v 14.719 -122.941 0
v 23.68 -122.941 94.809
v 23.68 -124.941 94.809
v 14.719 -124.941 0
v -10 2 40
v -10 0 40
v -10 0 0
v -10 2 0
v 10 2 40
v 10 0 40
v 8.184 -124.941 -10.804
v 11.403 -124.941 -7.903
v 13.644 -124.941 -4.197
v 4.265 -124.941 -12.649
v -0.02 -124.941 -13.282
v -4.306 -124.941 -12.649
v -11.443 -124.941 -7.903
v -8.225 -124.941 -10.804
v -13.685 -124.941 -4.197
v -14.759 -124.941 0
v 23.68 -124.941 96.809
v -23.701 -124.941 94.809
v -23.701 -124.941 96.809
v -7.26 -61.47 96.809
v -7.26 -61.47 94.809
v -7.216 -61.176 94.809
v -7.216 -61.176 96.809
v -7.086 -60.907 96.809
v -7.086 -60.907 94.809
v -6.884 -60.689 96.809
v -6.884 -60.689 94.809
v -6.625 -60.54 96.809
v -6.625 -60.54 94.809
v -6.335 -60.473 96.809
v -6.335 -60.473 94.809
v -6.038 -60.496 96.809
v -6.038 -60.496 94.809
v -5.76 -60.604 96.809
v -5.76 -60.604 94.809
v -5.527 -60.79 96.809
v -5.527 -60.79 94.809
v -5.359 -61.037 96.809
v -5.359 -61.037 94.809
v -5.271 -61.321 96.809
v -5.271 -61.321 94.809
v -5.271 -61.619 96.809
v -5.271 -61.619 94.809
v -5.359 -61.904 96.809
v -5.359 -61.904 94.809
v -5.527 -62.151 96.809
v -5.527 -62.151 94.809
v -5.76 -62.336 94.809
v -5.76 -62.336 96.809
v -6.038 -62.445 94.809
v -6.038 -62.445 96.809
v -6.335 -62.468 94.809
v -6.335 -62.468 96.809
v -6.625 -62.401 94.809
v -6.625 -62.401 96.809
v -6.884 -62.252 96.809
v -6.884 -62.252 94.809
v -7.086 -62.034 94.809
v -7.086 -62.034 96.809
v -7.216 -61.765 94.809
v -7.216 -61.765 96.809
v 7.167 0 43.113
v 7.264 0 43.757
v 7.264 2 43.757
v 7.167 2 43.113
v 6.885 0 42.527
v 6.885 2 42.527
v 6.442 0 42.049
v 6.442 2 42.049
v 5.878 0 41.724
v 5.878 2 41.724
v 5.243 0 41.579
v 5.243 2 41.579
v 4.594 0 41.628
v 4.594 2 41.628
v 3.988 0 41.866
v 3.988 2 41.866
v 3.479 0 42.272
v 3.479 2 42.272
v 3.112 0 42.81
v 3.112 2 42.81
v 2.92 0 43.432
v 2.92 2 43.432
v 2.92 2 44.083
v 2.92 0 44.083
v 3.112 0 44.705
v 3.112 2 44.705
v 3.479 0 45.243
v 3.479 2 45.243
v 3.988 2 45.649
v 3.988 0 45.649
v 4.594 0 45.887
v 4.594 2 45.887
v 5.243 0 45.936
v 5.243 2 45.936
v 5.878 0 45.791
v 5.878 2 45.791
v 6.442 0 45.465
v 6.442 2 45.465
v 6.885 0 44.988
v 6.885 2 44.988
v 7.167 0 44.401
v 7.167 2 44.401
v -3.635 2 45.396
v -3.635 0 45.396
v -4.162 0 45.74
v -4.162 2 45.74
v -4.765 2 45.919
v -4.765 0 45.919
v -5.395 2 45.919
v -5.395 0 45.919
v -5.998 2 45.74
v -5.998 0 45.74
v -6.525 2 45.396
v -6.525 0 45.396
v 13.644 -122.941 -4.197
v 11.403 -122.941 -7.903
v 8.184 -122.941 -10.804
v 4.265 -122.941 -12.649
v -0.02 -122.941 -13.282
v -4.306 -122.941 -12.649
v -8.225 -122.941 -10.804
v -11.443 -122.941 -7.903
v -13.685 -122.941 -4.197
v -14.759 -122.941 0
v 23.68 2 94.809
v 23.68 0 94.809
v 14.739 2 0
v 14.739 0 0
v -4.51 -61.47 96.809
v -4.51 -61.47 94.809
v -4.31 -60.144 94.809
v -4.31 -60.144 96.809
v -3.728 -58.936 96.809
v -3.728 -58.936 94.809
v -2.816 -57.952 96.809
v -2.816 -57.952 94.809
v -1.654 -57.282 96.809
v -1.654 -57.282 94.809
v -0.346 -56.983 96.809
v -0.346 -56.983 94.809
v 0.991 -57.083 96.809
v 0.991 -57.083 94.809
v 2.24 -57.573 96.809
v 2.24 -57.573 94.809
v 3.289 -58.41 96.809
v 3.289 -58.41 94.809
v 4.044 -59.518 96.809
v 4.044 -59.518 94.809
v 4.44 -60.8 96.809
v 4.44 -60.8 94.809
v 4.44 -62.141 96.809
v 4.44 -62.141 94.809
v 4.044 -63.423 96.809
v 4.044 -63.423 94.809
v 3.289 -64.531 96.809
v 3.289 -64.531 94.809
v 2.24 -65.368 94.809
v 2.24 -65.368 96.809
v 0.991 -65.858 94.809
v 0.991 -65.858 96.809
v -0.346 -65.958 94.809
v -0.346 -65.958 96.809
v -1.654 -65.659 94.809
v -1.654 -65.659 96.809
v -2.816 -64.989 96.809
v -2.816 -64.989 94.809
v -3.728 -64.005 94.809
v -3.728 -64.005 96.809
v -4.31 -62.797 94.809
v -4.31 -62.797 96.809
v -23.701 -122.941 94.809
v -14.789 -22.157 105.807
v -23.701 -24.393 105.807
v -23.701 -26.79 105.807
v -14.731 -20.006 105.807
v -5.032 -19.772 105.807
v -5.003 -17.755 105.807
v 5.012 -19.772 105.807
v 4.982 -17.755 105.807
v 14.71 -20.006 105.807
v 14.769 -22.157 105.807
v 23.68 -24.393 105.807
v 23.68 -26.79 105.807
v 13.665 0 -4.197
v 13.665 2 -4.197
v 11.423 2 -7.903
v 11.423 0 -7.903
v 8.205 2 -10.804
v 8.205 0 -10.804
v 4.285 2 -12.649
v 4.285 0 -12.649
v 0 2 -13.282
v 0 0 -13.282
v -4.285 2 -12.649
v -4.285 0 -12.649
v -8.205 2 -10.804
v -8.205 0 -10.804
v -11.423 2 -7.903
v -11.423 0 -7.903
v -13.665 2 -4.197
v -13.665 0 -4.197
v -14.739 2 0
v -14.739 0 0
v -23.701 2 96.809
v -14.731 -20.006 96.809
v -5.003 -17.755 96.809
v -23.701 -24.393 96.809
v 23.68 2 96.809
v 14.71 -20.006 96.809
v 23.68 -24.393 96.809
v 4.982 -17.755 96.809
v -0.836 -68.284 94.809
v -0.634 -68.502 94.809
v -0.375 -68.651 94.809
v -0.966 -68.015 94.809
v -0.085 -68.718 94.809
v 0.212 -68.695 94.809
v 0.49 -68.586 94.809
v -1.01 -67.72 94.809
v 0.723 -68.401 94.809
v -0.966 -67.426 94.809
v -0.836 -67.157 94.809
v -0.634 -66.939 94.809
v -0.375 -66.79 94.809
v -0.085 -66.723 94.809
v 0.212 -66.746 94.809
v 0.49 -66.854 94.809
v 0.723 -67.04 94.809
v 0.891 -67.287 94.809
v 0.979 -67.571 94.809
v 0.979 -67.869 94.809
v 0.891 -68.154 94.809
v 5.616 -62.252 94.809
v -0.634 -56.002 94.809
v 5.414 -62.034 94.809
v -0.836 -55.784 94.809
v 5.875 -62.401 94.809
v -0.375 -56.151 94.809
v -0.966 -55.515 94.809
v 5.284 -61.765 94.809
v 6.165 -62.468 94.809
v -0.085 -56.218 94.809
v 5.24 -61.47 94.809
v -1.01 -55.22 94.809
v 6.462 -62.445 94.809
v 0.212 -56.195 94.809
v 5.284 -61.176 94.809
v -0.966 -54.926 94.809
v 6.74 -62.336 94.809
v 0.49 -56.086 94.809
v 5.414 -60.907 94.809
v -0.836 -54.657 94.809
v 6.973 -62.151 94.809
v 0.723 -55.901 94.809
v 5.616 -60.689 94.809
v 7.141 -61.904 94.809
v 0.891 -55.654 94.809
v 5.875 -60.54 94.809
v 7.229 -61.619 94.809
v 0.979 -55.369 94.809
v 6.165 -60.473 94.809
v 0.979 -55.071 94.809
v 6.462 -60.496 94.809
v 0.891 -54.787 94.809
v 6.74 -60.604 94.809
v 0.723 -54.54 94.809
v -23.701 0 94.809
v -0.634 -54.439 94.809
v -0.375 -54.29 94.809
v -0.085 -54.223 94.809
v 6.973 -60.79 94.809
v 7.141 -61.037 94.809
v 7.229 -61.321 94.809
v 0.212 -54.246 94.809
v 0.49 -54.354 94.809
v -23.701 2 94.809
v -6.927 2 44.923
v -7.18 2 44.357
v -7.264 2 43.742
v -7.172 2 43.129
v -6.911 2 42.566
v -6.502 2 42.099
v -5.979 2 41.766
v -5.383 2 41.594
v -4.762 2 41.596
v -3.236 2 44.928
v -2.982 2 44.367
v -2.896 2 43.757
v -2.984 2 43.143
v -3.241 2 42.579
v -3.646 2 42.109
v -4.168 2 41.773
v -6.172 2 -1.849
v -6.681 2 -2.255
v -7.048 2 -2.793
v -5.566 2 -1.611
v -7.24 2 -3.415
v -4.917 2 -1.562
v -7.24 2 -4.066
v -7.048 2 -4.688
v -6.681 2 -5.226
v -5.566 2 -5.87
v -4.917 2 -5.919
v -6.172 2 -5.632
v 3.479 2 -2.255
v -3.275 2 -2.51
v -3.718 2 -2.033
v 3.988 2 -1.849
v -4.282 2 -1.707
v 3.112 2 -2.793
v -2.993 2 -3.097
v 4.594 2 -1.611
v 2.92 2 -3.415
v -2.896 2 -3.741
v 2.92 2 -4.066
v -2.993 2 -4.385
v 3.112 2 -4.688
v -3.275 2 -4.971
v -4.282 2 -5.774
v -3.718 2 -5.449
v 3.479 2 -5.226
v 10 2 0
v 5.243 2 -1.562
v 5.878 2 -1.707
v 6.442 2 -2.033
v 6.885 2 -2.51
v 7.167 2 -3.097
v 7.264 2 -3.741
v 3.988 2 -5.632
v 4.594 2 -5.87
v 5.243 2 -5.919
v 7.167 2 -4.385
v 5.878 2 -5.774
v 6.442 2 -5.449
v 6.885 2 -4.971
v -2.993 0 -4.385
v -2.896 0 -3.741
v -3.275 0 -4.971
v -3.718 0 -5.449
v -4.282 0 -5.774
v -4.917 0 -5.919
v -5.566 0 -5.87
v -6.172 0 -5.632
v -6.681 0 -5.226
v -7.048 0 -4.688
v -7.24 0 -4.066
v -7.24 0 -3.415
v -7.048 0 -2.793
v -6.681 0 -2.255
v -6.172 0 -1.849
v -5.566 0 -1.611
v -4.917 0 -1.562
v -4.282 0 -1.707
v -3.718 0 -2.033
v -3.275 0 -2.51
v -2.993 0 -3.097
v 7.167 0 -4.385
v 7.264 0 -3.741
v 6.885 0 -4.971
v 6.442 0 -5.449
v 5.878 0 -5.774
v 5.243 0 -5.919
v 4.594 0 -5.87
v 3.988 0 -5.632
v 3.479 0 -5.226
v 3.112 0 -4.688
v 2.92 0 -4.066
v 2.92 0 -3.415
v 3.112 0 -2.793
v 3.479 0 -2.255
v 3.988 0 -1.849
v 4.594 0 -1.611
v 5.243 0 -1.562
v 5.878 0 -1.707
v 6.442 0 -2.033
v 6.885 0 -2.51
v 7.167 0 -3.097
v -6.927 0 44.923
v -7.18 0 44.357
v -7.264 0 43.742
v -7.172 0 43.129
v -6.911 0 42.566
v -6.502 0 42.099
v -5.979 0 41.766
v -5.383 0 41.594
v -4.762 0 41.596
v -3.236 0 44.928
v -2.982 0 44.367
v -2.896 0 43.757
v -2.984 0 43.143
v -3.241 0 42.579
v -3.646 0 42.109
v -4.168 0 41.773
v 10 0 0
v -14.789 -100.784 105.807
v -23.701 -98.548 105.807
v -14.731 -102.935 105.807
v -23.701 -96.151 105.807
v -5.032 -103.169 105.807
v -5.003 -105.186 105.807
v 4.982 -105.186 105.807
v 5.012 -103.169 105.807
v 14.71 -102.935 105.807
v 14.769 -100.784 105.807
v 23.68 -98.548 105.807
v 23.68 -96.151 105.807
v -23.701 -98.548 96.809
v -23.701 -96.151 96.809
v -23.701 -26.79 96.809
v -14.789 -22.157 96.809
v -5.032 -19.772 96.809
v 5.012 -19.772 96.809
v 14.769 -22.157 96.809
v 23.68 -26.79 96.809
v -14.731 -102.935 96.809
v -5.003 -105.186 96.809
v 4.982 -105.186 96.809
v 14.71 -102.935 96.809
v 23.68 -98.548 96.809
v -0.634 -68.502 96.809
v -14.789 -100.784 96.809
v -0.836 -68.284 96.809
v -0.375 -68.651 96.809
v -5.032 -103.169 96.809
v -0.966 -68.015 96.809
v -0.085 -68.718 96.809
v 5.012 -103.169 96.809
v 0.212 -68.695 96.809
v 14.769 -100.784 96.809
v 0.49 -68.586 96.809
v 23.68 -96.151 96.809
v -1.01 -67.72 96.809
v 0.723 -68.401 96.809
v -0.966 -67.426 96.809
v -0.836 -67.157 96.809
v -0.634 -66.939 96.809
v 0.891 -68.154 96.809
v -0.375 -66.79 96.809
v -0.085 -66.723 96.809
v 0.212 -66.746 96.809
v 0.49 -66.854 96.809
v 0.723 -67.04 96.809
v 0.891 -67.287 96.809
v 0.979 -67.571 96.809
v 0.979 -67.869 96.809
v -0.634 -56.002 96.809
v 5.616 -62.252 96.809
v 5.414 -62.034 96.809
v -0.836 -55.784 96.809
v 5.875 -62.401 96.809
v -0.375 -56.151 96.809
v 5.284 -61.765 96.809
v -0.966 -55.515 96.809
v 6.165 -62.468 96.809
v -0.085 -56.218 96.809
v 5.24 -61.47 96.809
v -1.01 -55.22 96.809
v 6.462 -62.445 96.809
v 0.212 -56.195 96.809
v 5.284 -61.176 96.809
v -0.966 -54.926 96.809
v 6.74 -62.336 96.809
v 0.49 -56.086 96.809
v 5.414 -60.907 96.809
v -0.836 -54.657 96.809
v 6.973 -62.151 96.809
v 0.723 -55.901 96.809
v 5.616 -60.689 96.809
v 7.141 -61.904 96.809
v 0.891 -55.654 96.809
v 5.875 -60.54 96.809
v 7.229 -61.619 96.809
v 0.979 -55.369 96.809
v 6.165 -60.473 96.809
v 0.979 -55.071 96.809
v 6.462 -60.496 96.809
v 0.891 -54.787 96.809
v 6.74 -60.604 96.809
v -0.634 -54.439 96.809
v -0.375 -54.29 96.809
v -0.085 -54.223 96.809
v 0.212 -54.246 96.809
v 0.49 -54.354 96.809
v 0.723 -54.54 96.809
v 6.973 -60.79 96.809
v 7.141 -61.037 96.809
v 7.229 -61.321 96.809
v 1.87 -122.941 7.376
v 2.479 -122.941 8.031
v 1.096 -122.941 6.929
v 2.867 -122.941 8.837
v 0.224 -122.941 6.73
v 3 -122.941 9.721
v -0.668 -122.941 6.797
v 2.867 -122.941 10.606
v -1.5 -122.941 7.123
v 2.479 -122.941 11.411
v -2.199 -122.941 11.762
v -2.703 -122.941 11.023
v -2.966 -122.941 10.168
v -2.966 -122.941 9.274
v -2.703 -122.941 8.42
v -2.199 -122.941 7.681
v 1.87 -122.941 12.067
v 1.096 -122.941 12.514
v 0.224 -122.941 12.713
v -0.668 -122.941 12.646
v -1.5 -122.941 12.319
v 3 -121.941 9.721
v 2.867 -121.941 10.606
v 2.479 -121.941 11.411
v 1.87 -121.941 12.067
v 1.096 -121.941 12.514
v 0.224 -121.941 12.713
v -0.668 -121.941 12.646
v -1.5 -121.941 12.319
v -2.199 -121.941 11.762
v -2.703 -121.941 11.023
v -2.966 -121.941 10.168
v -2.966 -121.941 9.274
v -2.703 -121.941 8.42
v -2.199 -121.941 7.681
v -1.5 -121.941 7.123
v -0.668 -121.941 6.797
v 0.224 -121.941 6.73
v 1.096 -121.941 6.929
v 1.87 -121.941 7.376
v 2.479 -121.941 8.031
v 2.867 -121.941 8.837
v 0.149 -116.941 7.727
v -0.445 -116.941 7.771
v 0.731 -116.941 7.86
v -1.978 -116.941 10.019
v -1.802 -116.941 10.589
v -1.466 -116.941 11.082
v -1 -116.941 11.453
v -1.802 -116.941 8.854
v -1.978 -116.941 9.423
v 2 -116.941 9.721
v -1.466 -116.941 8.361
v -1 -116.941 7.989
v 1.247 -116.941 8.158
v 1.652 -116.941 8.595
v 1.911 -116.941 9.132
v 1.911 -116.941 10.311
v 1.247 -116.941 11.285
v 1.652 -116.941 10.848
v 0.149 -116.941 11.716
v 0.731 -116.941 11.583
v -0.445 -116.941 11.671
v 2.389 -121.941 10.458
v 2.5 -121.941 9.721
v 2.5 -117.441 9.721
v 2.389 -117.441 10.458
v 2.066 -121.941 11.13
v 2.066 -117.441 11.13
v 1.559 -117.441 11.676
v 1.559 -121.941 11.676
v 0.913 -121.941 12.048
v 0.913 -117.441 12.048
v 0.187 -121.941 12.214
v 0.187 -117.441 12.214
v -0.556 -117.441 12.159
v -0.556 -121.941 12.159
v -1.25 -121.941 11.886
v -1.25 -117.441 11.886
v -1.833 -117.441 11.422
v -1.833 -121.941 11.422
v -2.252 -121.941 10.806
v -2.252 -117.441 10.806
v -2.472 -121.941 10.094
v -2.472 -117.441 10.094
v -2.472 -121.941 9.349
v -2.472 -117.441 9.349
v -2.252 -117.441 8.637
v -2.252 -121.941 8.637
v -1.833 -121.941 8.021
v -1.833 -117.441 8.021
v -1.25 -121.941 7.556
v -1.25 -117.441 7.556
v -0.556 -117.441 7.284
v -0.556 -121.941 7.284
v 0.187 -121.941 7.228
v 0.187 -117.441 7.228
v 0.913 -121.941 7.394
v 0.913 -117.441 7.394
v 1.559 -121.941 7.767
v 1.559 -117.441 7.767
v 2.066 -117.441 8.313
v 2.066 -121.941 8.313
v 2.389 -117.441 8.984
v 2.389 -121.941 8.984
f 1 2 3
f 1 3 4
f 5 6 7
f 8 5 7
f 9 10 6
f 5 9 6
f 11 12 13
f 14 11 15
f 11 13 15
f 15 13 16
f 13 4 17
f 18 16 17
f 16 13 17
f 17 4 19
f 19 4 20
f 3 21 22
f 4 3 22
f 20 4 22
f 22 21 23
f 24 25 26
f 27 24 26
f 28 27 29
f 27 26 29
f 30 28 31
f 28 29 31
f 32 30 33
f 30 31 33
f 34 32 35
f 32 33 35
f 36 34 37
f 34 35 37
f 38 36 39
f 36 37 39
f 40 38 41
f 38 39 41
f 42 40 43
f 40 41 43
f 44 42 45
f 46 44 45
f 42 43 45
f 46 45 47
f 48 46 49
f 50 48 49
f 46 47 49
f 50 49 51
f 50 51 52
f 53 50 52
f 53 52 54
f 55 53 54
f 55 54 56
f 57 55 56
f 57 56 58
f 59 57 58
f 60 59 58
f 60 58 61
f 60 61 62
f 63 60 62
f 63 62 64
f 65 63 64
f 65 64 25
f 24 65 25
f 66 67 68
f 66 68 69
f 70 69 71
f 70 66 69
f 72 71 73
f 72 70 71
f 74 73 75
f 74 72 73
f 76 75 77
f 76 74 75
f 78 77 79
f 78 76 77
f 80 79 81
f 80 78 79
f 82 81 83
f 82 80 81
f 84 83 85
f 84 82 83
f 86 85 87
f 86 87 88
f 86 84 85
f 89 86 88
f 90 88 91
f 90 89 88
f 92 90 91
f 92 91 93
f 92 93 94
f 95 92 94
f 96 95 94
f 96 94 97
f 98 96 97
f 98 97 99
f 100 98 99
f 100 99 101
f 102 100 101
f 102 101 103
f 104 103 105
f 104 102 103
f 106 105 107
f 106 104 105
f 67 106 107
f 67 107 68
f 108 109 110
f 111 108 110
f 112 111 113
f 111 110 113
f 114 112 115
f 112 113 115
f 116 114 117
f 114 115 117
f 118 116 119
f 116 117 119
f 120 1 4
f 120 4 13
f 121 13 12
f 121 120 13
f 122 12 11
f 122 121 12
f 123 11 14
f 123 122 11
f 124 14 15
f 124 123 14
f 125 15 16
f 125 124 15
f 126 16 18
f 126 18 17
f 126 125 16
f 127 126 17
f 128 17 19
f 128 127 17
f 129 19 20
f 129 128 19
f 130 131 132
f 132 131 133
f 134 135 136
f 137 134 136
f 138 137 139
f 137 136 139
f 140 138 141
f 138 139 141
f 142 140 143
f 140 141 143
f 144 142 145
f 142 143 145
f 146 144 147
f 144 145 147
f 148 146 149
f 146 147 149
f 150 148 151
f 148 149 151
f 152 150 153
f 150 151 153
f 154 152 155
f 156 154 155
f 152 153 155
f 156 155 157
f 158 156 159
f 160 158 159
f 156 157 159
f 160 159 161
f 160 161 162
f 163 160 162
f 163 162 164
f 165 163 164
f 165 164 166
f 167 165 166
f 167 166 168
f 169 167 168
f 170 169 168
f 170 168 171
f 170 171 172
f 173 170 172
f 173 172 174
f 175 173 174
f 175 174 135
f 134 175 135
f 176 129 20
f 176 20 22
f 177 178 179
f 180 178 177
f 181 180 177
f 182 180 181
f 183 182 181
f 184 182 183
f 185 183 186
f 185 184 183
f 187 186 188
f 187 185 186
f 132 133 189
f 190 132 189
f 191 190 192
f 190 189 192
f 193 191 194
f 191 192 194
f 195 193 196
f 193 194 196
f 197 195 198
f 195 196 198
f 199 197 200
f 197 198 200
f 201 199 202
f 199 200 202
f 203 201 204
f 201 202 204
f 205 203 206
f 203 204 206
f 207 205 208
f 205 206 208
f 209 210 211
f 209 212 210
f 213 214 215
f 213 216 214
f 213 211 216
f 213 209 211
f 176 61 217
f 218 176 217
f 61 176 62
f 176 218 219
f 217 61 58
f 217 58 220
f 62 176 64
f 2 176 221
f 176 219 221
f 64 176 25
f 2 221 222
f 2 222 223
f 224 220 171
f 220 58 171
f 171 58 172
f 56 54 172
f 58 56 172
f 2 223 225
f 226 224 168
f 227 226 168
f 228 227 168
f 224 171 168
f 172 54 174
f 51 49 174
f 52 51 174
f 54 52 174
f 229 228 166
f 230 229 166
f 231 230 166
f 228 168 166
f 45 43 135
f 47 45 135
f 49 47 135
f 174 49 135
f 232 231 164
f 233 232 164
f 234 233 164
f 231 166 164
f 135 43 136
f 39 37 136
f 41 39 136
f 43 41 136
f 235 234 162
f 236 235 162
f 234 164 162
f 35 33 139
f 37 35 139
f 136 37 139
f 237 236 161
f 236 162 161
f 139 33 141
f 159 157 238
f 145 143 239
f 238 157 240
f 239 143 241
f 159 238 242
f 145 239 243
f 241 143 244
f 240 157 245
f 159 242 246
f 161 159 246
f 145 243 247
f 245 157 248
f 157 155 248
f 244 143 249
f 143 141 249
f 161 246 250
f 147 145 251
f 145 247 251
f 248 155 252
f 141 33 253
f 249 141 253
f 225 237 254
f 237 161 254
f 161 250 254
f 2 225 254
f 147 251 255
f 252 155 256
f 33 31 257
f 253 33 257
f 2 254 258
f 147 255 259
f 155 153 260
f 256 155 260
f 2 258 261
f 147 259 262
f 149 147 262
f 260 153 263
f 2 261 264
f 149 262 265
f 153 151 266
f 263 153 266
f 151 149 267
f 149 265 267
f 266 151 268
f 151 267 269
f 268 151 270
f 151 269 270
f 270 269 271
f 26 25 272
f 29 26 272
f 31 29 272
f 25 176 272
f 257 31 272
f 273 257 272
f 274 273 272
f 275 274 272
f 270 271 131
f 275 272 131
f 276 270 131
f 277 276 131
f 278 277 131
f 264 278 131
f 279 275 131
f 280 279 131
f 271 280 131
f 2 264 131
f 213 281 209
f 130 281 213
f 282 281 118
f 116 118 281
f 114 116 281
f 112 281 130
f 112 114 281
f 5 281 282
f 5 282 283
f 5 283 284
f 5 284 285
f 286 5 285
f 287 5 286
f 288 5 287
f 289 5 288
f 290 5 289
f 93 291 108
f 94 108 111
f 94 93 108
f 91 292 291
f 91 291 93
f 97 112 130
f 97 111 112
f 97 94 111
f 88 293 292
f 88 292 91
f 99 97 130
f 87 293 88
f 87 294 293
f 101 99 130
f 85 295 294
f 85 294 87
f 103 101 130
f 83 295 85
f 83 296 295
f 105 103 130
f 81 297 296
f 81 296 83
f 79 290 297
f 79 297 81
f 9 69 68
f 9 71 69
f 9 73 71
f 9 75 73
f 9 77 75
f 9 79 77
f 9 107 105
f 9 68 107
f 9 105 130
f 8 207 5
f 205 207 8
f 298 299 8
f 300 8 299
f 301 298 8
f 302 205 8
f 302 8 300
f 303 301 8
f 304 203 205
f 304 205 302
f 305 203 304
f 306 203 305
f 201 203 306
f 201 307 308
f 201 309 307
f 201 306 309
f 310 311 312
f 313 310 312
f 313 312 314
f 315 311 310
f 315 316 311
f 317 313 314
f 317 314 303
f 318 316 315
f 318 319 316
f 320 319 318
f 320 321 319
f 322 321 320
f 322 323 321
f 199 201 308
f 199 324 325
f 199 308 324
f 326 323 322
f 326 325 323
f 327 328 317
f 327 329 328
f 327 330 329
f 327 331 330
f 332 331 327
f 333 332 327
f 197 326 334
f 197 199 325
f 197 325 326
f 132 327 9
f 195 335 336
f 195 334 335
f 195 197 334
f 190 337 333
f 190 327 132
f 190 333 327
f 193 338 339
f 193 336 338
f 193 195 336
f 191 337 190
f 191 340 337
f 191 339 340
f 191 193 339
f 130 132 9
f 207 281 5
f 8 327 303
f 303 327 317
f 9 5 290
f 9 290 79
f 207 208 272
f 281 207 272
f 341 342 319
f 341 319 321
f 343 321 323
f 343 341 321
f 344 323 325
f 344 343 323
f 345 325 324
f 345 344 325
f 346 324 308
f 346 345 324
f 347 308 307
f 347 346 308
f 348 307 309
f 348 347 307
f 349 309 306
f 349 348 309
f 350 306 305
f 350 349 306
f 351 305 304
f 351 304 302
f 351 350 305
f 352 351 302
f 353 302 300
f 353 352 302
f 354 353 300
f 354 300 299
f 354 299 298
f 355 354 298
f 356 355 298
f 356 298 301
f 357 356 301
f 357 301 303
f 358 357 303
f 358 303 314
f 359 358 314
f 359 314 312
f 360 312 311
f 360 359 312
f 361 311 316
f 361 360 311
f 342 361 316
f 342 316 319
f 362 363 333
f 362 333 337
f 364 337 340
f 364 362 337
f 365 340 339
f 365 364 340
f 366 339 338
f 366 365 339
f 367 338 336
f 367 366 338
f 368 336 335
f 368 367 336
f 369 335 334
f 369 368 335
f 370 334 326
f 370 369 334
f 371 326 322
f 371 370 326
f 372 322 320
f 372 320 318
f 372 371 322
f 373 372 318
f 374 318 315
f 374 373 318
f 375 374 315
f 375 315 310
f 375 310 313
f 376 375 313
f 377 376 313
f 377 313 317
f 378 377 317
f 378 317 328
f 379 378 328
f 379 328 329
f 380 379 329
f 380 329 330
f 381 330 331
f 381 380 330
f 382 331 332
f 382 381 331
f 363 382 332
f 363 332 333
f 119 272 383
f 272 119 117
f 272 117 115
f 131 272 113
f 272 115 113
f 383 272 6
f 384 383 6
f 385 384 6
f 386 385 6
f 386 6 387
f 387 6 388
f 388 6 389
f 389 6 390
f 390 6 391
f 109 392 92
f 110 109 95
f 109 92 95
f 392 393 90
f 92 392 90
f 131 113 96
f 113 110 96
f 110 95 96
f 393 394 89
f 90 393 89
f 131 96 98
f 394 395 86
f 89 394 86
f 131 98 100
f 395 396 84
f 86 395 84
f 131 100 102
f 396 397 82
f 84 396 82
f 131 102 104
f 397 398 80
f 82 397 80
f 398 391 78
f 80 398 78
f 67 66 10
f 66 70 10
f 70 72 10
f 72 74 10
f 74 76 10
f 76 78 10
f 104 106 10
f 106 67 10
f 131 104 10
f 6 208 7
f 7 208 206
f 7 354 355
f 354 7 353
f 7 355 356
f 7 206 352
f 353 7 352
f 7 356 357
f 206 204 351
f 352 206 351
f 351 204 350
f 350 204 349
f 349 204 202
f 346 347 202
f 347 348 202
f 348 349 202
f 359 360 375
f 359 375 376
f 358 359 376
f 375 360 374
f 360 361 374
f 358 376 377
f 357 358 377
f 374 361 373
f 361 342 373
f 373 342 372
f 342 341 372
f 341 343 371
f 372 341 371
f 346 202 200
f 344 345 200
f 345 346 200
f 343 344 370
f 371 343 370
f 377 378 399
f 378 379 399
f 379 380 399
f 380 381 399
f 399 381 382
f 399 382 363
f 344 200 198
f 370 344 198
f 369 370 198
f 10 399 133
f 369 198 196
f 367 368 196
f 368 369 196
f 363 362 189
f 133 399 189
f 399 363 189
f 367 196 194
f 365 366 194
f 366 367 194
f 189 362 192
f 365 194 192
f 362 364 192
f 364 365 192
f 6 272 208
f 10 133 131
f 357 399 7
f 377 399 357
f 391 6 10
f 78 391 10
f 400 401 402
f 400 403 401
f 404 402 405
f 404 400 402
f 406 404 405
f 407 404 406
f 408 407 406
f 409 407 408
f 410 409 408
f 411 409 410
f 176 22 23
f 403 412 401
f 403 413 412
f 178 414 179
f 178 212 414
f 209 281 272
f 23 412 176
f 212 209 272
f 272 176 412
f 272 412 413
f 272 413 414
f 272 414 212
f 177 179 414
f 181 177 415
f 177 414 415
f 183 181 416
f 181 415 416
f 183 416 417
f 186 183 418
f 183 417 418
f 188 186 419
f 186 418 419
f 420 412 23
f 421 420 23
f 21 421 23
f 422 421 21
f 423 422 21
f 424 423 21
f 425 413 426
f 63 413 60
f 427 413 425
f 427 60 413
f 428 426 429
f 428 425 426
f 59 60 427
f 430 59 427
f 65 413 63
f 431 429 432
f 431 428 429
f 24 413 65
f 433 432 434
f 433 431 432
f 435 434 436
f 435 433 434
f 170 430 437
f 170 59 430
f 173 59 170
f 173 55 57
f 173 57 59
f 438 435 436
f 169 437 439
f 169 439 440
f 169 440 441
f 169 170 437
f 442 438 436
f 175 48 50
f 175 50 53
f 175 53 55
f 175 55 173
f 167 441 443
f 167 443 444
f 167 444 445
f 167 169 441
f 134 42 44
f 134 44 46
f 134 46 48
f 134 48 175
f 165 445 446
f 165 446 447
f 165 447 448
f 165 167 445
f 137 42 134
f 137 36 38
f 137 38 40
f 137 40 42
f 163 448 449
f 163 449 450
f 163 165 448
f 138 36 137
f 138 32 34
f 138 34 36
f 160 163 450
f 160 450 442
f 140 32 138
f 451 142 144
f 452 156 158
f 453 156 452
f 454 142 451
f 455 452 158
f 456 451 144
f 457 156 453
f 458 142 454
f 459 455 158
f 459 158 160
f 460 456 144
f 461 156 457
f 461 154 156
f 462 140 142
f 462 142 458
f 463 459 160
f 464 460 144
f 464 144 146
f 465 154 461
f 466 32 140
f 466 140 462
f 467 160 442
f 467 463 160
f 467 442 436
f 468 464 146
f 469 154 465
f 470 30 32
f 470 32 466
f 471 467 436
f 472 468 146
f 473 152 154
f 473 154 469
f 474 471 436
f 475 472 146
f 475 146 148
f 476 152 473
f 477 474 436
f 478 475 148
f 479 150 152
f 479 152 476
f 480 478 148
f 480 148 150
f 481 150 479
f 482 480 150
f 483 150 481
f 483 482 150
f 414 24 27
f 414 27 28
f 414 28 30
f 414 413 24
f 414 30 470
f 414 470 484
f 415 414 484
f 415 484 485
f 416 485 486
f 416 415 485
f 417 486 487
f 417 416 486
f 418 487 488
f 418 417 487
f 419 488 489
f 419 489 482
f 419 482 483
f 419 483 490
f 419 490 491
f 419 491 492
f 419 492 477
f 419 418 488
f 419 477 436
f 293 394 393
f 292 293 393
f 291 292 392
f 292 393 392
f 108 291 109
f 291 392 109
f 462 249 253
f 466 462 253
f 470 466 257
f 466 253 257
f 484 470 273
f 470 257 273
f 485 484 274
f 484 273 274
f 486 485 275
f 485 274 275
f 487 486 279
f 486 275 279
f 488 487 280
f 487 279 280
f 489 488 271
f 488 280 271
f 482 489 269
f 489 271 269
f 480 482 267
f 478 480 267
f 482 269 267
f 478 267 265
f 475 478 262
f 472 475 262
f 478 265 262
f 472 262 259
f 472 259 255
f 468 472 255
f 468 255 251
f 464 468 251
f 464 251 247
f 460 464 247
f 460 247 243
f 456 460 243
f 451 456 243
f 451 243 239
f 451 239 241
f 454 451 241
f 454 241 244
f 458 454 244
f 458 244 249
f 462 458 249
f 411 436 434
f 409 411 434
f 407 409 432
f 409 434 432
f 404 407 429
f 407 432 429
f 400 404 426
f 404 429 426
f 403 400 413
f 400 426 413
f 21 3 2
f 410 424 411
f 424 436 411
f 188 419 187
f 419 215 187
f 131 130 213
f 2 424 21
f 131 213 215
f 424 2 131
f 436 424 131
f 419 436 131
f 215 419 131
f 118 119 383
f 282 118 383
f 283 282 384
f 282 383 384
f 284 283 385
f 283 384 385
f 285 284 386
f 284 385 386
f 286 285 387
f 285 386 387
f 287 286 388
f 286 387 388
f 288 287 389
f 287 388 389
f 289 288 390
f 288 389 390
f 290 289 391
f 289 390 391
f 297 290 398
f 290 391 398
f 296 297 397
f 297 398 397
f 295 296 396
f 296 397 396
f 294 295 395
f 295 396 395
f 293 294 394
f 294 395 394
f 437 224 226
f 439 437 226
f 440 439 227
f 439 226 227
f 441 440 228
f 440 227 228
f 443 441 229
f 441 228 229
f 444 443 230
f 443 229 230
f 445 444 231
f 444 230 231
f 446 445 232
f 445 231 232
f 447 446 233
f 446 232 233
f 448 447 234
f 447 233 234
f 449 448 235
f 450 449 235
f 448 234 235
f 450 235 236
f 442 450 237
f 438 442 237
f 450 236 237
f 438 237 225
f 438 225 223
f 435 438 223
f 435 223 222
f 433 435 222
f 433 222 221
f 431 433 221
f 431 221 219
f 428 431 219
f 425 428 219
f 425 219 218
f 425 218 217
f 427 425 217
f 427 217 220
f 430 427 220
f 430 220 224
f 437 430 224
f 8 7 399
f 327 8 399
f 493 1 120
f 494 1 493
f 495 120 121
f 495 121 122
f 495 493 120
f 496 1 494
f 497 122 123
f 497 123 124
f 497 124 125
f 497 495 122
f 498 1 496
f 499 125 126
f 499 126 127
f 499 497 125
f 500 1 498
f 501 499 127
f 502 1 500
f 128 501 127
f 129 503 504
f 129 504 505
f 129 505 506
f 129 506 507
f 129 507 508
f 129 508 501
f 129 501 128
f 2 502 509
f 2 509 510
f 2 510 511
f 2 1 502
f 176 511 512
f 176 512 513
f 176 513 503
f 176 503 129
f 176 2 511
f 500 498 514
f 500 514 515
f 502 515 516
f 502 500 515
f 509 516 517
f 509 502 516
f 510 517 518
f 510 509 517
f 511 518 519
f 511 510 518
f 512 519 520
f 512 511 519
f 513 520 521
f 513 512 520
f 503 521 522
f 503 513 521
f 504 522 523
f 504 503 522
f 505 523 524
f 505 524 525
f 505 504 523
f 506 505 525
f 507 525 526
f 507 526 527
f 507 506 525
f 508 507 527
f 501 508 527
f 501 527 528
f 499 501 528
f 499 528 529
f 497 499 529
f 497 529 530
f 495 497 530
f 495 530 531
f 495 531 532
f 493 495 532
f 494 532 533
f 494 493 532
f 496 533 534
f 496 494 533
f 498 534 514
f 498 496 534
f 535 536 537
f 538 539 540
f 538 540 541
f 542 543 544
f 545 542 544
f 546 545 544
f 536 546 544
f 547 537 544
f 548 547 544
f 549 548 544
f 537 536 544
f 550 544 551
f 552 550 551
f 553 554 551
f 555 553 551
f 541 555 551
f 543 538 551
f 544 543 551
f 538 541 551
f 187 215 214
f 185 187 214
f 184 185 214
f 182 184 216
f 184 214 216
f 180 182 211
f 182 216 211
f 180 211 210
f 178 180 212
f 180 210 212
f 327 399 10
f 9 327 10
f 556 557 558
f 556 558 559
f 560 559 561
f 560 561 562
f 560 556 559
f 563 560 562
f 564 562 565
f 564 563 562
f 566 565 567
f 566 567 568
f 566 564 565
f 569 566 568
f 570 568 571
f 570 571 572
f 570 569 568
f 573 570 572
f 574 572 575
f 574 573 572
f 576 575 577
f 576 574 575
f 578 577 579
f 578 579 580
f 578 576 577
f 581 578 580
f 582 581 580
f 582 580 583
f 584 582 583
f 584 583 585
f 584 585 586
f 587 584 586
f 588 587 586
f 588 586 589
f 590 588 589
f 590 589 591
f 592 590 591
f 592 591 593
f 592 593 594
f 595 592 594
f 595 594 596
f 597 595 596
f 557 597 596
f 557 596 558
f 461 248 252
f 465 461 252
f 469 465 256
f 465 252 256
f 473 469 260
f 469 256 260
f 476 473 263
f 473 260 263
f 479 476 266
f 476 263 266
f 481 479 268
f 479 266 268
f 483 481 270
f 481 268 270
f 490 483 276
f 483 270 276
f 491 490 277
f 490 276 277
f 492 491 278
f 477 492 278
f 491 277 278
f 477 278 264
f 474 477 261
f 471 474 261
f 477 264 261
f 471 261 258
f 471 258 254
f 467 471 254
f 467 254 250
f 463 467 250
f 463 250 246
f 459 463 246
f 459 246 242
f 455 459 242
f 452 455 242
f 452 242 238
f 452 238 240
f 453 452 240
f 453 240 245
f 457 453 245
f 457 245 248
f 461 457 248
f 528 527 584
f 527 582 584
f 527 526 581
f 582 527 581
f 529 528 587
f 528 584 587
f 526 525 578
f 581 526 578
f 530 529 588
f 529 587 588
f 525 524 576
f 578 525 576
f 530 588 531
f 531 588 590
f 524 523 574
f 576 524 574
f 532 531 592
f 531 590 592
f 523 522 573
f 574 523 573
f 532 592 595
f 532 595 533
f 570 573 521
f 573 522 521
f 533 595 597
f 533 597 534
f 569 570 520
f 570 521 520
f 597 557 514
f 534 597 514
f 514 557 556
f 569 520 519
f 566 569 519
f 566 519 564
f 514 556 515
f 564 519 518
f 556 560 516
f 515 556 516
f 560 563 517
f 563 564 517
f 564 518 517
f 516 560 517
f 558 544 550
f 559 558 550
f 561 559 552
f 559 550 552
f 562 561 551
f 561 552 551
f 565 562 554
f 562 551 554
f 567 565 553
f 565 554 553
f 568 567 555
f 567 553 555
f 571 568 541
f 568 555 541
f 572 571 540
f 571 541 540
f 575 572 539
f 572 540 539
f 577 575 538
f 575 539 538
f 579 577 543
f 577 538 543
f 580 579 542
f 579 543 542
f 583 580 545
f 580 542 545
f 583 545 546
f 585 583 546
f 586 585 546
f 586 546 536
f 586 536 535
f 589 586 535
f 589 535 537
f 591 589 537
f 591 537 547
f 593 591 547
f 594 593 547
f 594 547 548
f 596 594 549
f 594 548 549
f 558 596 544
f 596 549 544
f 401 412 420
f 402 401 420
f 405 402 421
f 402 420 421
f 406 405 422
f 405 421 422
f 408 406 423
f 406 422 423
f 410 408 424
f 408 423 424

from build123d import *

# Parameters (mm, degrees)
SKETCH1_R                = 2.1844
BOSS_EXTRUDE1_DEPTH      = 2
BOSS_EXTRUDE2_DEPTH      = 2
BOSS_EXTRUDE2_DEPTH_BACK = 122.9409
SKETCH1_3_W              = 47.380920583
SKETCH1_3_H              = 2
BOSS_EXTRUDE3_DEPTH      = 2
SKETCH2_3_R              = 3
SKETCH2_3_R_2            = 2.5
BOSS_EXTRUDE4_DEPTH      = 1
SKETCH2_4_R              = 2.5
BOSS_EXTRUDE5_DEPTH      = 6
CHAMFER1_SIZE            = 0.5
SKETCH3_R                = 4.5
SKETCH3_R_2              = 1
CUT_EXTRUDE1_DEPTH       = 10
BOSS_EXTRUDE6_DEPTH      = 8.99804


with BuildPart() as part:
    # Sketch1 → Boss-Extrude1 (new body)
    with BuildSketch(Plane(origin=(0, 0, 0), x_dir=(1, 0, 0), z_dir=(0, 1, 0))):
        with BuildLine():
            ThreePointArc((14.738721003, 0), (0, 13.282171548), (-14.738721003, 0))
            Line((-14.738721003, 0), (-23.700563463, -94.809011723))
            Line((-23.700563463, -94.809011723), (23.68035712, -94.809011723))
            Line((23.68035712, -94.809011723), (14.738721003, 0))
        make_face()
        with BuildLine():
            ThreePointArc((-6.524844791, -45.395600002), (-5.978744791, -41.766355211), (-2.8956, -43.757300002))
            ThreePointArc((-2.8956, -43.757300002), (-3.089055209, -44.656044793), (-3.635155209, -45.395600002))
            ThreePointArc((-3.635155209, -45.395600002), (-5.08, -45.941700002), (-6.524844791, -45.395600002))
        make_face(mode=Mode.SUBTRACT)
        with Locations((5.08, -43.757300002)):
            Circle(SKETCH1_R, mode=Mode.SUBTRACT)
        with Locations((-5.08, 3.740699998)):
            Circle(SKETCH1_R, mode=Mode.SUBTRACT)
        Polygon((-10, 0), (0, 0), (10, 0), (10, -40), (-10, -40), align=None, mode=Mode.SUBTRACT)
        with Locations((5.08, 3.740699998)):
            Circle(SKETCH1_R, mode=Mode.SUBTRACT)
    extrude(amount=BOSS_EXTRUDE1_DEPTH)

    # Sketch1<3> → Boss-Extrude2 (add, two sides: drawn at the far end of the back side and taken through both)
    with BuildSketch(Plane(origin=(0, 0, 0), x_dir=(1, 0, 0), z_dir=(0, 1, 0)).offset(-BOSS_EXTRUDE2_DEPTH_BACK)):
        with Locations((-0.010103172, -95.809011723)):
            Rectangle(SKETCH1_3_W, SKETCH1_3_H)
    extrude(amount=BOSS_EXTRUDE2_DEPTH + BOSS_EXTRUDE2_DEPTH_BACK)

    # Sketch2 → Boss-Extrude3 (add)
    with BuildSketch(Plane.XZ.offset(122.9409)):
        with BuildLine():
            ThreePointArc((-14.758927346, 0), (-0.020206343, -13.282171548), (14.71851466, 0))
            Line((14.71851466, 0), (23.68035712, 94.809011723))
            Line((23.68035712, 94.809011723), (23.68035712, 96.809011723))
            Line((23.68035712, 96.809011723), (-23.700563463, 96.809011723))
            Line((-23.700563463, 96.809011723), (-23.700563463, 94.809011723))
            Line((-23.700563463, 94.809011723), (-14.758927346, 0))
        make_face()
    extrude(amount=BOSS_EXTRUDE3_DEPTH)

    # Sketch2<3> → Boss-Extrude4 (add)
    with BuildSketch(Plane.XZ.offset(122.9409)):
        with Locations((0, 9.721300002)):
            Circle(SKETCH2_3_R)
        with Locations((0, 9.721300002)):
            Circle(SKETCH2_3_R_2, mode=Mode.SUBTRACT)
    extrude(amount=-BOSS_EXTRUDE4_DEPTH)

    # Sketch2<4> → Boss-Extrude5 (add)
    with BuildSketch(Plane.XZ.offset(122.9409)):
        with Locations((0, 9.721300002)):
            Circle(SKETCH2_4_R)
    extrude(amount=-BOSS_EXTRUDE5_DEPTH)

    # Chamfer1
    chamfer1_edges = [part.edges().sort_by_distance(p)[0] for p in [
        (-2.5, -116.9409, 9.721300002),
    ]]
    chamfer(chamfer1_edges, length=CHAMFER1_SIZE)

    # Sketch3 → Cut-Extrude1 (cut)
    with BuildSketch(Plane(origin=(0, 0, 94.809011723), x_dir=(-1, 0, 0), z_dir=(0, 0, -1))):
        with Locations((0.010103172, -61.47045)):
            Circle(SKETCH3_R)
        with Locations((6.260103172, -61.47045)):
            Circle(SKETCH3_R_2)
        with Locations((0.010103172, -67.72045)):
            Circle(SKETCH3_R_2)
        with Locations((-6.239896828, -61.47045)):
            Circle(SKETCH3_R_2)
        with Locations((0.010103172, -55.22045)):
            Circle(SKETCH3_R_2)
    extrude(amount=-CUT_EXTRUDE1_DEPTH, mode=Mode.SUBTRACT)

    # Sketch4 → Boss-Extrude6 (add)
    with BuildSketch(Plane.XY.offset(96.809011723)):
        with BuildLine():
            ThreePointArc((-23.700563463, -98.548234335), (-0.010103172, -105.47045), (23.68035712, -98.548234335))
            Line((23.68035712, -98.548234335), (23.68035712, -96.151310589))
            ThreePointArc((23.68035712, -96.151310589), (-0.010103172, -103.47045), (-23.700563463, -96.151310589))
            Line((-23.700563463, -96.151310589), (-23.700563463, -98.548234335))
        make_face()
        with BuildLine():
            ThreePointArc((-23.700563463, -26.789589411), (-0.010103172, -19.47045), (23.68035712, -26.789589411))
            Line((23.68035712, -26.789589411), (23.68035712, -24.392665665))
            ThreePointArc((23.68035712, -24.392665665), (-0.010103172, -17.47045), (-23.700563463, -24.392665665))
            Line((-23.700563463, -24.392665665), (-23.700563463, -26.789589411))
        make_face()
    extrude(amount=BOSS_EXTRUDE6_DEPTH)


solid = part.part
